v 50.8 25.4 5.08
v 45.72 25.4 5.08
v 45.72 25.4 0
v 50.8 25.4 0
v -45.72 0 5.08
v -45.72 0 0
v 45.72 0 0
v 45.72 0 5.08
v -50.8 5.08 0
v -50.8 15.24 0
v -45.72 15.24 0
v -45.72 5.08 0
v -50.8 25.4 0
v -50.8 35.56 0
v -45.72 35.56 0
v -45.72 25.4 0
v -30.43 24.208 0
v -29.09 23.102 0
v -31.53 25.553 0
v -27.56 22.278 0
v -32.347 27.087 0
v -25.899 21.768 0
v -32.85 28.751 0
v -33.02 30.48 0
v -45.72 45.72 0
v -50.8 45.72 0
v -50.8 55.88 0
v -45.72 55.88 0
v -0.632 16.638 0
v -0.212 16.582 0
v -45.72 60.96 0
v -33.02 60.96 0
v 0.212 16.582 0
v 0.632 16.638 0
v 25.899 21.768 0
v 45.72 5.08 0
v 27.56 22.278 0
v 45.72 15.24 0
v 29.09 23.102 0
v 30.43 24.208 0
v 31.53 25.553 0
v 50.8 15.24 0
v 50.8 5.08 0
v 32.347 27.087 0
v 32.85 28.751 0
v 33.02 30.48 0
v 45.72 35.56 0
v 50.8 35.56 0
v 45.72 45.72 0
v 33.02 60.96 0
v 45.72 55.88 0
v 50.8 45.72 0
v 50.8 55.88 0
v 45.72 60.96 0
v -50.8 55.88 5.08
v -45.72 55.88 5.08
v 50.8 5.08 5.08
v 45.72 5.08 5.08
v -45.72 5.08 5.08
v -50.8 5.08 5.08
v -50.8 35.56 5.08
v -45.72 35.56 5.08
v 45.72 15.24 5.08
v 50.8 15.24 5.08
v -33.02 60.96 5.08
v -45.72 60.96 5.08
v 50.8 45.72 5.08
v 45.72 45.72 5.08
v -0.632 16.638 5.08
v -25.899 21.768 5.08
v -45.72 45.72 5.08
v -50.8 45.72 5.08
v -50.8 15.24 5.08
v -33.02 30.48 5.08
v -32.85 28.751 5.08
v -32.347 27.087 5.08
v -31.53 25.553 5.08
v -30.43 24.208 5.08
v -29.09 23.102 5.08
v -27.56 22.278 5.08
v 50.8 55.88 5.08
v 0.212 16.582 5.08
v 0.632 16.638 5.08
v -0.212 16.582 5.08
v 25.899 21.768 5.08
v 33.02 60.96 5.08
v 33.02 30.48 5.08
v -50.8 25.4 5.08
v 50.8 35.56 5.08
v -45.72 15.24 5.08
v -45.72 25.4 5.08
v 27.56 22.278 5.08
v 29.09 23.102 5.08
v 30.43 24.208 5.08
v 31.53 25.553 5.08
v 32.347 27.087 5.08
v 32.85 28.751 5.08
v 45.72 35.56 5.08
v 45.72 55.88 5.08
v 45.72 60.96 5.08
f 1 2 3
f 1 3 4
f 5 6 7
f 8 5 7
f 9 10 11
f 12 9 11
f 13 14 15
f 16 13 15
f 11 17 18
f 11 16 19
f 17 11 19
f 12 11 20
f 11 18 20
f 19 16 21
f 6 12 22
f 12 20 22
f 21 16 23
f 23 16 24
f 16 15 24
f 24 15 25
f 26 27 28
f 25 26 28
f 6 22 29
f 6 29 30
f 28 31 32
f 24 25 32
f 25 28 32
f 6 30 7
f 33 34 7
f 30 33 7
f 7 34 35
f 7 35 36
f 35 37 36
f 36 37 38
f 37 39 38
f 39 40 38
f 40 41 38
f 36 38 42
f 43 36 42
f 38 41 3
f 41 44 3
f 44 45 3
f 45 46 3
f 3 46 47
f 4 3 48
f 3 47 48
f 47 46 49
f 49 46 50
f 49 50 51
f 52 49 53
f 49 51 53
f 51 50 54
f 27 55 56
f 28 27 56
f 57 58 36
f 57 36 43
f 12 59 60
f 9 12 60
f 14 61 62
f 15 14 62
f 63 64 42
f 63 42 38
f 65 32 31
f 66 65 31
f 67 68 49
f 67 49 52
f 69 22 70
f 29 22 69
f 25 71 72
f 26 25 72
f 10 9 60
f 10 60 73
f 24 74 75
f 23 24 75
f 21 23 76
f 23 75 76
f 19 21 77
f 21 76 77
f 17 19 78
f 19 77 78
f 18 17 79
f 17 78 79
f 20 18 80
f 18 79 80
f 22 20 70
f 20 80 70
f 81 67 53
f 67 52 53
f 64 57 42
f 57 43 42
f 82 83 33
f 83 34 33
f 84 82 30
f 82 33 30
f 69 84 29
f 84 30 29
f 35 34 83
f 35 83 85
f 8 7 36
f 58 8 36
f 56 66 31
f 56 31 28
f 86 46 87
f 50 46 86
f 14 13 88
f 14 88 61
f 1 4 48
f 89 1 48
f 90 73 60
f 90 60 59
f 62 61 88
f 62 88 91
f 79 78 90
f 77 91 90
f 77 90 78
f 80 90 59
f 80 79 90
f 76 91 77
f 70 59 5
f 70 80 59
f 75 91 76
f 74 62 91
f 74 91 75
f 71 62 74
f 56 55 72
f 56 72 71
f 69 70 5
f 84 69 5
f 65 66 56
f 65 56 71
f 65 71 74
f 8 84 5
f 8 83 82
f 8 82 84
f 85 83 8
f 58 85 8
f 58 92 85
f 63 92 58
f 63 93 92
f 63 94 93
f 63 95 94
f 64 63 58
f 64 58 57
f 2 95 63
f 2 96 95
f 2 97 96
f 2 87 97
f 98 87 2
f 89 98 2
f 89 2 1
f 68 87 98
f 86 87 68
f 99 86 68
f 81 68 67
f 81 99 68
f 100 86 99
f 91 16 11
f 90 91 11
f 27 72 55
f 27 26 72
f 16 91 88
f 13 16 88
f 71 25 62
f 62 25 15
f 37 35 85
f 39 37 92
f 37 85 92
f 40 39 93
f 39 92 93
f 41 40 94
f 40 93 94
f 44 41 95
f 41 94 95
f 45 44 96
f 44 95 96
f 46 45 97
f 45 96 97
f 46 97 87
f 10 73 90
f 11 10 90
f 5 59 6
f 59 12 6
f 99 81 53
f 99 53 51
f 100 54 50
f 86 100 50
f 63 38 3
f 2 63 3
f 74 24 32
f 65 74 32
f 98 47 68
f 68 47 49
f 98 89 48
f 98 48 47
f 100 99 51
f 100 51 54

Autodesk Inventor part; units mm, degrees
ref_plane "YZ Plane" through (0, 0, 0) normal (1, 0, 0) x (0, 1, 0)
ref_plane "XZ Plane" through (0, 0, 0) normal (0, 1, 0) x (-1, 0, 0)
ref_plane "XY Plane" through (0, 0, 0) normal (0, 0, 1) x (1, 0, 0)
sketch "Sketch1" plane through (0, 0, 0) normal (0, 0, 1) x (1, 0, 0)
  line L0 (45.72, 0) -> (45.72, 60.96)
  line L1 (45.72, 60.96) -> (-45.72, 60.96)
  line L2 (-45.72, 60.96) -> (-45.72, 9.301)
  line L3 (-45.72, 5.08) -> (-50.8, 5.08)
  line L4 (-50.8, 5.08) -> (-50.8, 15.24)
  line L5 (-50.8, 15.24) -> (-45.72, 15.24)
  line L6 (-45.72, 15.24) -> (-45.72, 5.08)
  line L7 (-45.72, 25.4) -> (-50.8, 25.4)
  line L8 (-50.8, 25.4) -> (-50.8, 35.56)
  line L9 (-50.8, 35.56) -> (-45.72, 35.56)
  line L10 (-45.72, 35.56) -> (-45.72, 25.4)
  line L11 (-45.72, 45.72) -> (-50.8, 45.72)
  line L12 (-50.8, 45.72) -> (-50.8, 55.88)
  line L13 (-50.8, 55.88) -> (-45.72, 55.88)
  line L14 (-45.72, 55.88) -> (-45.72, 45.72)
  line L15 (0, 60.96) -> (0, 0) construction
  line L16 (45.72, 60.96) -> (45.72, 0)
  line L17 (45.72, 5.08) -> (50.8, 5.08)
  line L18 (50.8, 5.08) -> (50.8, 15.24)
  line L19 (50.8, 15.24) -> (45.72, 15.24)
  line L20 (45.72, 15.24) -> (45.72, 5.08)
  line L21 (45.72, 25.4) -> (50.8, 25.4)
  line L22 (50.8, 25.4) -> (50.8, 35.56)
  line L23 (50.8, 35.56) -> (45.72, 35.56)
  line L24 (45.72, 35.56) -> (45.72, 25.4)
  line L25 (45.72, 45.72) -> (50.8, 45.72)
  line L26 (50.8, 45.72) -> (50.8, 55.88)
  line L27 (50.8, 55.88) -> (45.72, 55.88)
  line L28 (45.72, 55.88) -> (45.72, 45.72)
  line L29 (-45.72, 5.08) -> (-45.72, 0)
  line L30 (-45.72, 0) -> (45.72, 0)
  line L31 (45.72, 60.96) -> (-45.72, 60.96)
  line L32 (-45.72, 60.96) -> (-45.72, 0)
  line L33 (-45.72, 0) -> (45.72, 0)
  line L34 (45.72, 0) -> (45.72, 60.96)
  dimension "d0" = 91.44
  dimension "d2" = 10.16
  dimension "d3" = 5.08
  dimension "d7" = 20.32
  dimension "d14" = 5.08
  dimension "d15" = 60.96
extrude "Extrusion2" add sketch "Sketch1" along normal blind 5.08
sketch "Sketch5" plane through (0, 0, 5.08) normal (0, 0, 1) x (1, 0, 0)
  line L0 (50.8, 25.4) -> (50.8, 35.56) projected
  line L1 (50.8, 35.56) -> (45.72, 35.56) projected
  line L2 (45.72, 35.56) -> (45.72, 45.72) projected
  line L3 (45.72, 45.72) -> (50.8, 45.72) projected
  line L4 (50.8, 45.72) -> (50.8, 55.88) projected
  line L5 (50.8, 55.88) -> (45.72, 55.88) projected
  line L6 (45.72, 55.88) -> (45.72, 60.96) projected
  line L7 (45.72, 60.96) -> (-45.72, 60.96) projected
  line L8 (-45.72, 60.96) -> (-45.72, 55.88) projected
  line L9 (-45.72, 55.88) -> (-50.8, 55.88) projected
  line L10 (-50.8, 55.88) -> (-50.8, 45.72) projected
  line L11 (-50.8, 45.72) -> (-45.72, 45.72) projected
  line L12 (-45.72, 45.72) -> (-45.72, 35.56) projected
  line L13 (-45.72, 35.56) -> (-50.8, 35.56) projected
  line L14 (-50.8, 35.56) -> (-50.8, 25.4) projected
  line L15 (-50.8, 25.4) -> (-45.72, 25.4) projected
  line L16 (-45.72, 25.4) -> (-45.72, 15.24) projected
  line L17 (-45.72, 15.24) -> (-50.8, 15.24) projected
  line L18 (-50.8, 15.24) -> (-50.8, 5.08) projected
  line L19 (-50.8, 5.08) -> (-45.72, 5.08) projected
  line L20 (-45.72, 5.08) -> (-45.72, 0) projected
  line L21 (-45.72, 0) -> (45.72, 0) projected
  line L22 (45.72, 0) -> (45.72, 5.08) projected
  line L23 (45.72, 5.08) -> (50.8, 5.08) projected
  line L24 (50.8, 5.08) -> (50.8, 15.24) projected
  line L25 (50.8, 15.24) -> (45.72, 15.24) projected
  line L26 (45.72, 15.24) -> (45.72, 25.4) projected
  line L27 (45.72, 25.4) -> (50.8, 25.4) projected
  line L28 (-24.13, 30.48) -> (24.13, 30.48) construction
  line L29 (-24.13, 21.59) -> (24.13, 21.59)
  line L30 (24.13, 39.37) -> (-24.13, 39.37)
  arc A0 (-24.13, 39.37) -> (-24.13, 21.59) centre (-24.13, 30.48) ccw
  arc A1 (24.13, 21.59) -> (24.13, 39.37) centre (24.13, 30.48) ccw
  line L31 (45.72, 60.96) -> (-45.72, 60.96) construction
  line L32 (0, 60.96) -> (0, 0) construction
  point P0 (0, 30.48)
  dimension "d32" = 48.26
  dimension "d33" = 60.96
  dimension "d34" = 30.48
  dimension "d35" = 8.89
extrude "Extrusion6" cut sketch "Sketch5" against normal blind 25.4 contours A0 L30 A1 L29
sketch "Sketch6" plane through (0, 0, 0) normal (0, 0, -1) x (-1, 0, 0)
  arc A0 (-24.13, 39.37) -> (-24.13, 21.59) centre (-24.13, 30.48) ccw projected
  line L0 (-24.13, 39.37) -> (24.13, 39.37) projected
  arc A1 (24.13, 21.59) -> (24.13, 39.37) centre (24.13, 30.48) ccw projected
  line L1 (24.13, 21.59) -> (-24.13, 21.59) projected
  line L2 (-50.8, 35.56) -> (-50.8, 25.4) projected
  line L3 (-50.8, 25.4) -> (-45.72, 25.4) projected
  line L4 (-45.72, 15.24) -> (-45.72, 25.4) projected
  line L5 (-50.8, 15.24) -> (-45.72, 15.24) projected
  line L6 (-50.8, 5.08) -> (-50.8, 15.24) projected
  line L7 (-45.72, 5.08) -> (-50.8, 5.08) projected
  line L8 (-45.72, 0) -> (-45.72, 5.08) projected
  line L9 (45.72, 0) -> (-45.72, 0) construction
  line L10 (45.72, 5.08) -> (45.72, 0) projected
  line L11 (50.8, 5.08) -> (45.72, 5.08) projected
  line L12 (50.8, 15.24) -> (50.8, 5.08) projected
  line L13 (45.72, 15.24) -> (50.8, 15.24) projected
  line L14 (45.72, 25.4) -> (45.72, 15.24) projected
  line L15 (45.72, 25.4) -> (50.8, 25.4) projected
  line L16 (50.8, 25.4) -> (50.8, 35.56) projected
  line L17 (50.8, 35.56) -> (45.72, 35.56) projected
  line L18 (45.72, 45.72) -> (45.72, 35.56) projected
  line L19 (45.72, 45.72) -> (50.8, 45.72) projected
  line L20 (50.8, 45.72) -> (50.8, 55.88) projected
  line L21 (50.8, 55.88) -> (45.72, 55.88) projected
  line L22 (45.72, 60.96) -> (45.72, 55.88) projected
  line L23 (-45.72, 60.96) -> (45.72, 60.96) projected
  line L24 (-45.72, 55.88) -> (-45.72, 60.96) projected
  line L25 (-50.8, 55.88) -> (-45.72, 55.88) projected
  line L26 (-50.8, 45.72) -> (-50.8, 55.88) projected
  line L27 (-45.72, 45.72) -> (-50.8, 45.72) projected
  line L28 (-45.72, 35.56) -> (-45.72, 45.72) projected
  line L29 (-45.72, 35.56) -> (-50.8, 35.56) projected
  line L30 (33.02, 30.48) -> (33.02, 60.96)
  line L31 (-45.72, 60.96) -> (45.72, 60.96) projected
  arc A2 (-24.13, 39.37) -> (-24.13, 21.59) centre (-24.13, 30.48) ccw projected
  line L32 (-33.02, 30.48) -> (-33.02, 60.96)
  line L33 (-33.02, 60.96) -> (33.02, 60.96)
  arc A3 (24.13, 21.59) -> (24.13, 39.37) centre (24.13, 30.48) ccw projected
  line L34 (25.8987, 21.7677) -> (0.6317, 16.6382)
  line L35 (-0.6317, 16.6382) -> (-25.8987, 21.7677)
  arc A4 (24.13, 21.59) -> (24.13, 39.37) centre (24.13, 30.48) ccw projected
  line L36 (0, 21.59) -> (0, 0) construction
  arc A5 (-0.6317, 16.6382) -> (0.6317, 16.6382) centre (0, 19.7498) ccw
  circle A6 centre (24.13, 30.48) radius 8.89
  circle A7 centre (-24.13, 30.48) radius 8.89
  point P0 (0, 16.51)
  dimension "d38" = 5.08
  dimension "d39" = 3.175
extrude "Extrusion7" cut sketch "Sketch6" against normal blind 25.4 contours A0 L32 L23 L30 A1 L0 | A0 L1 A1 L34 A5 L35
equation "\"d7\" = 2 * d2"
equation "\"d34\" = 0.5 * d33"
properties part number "MotorShelf" material "Wood (Birch)"
